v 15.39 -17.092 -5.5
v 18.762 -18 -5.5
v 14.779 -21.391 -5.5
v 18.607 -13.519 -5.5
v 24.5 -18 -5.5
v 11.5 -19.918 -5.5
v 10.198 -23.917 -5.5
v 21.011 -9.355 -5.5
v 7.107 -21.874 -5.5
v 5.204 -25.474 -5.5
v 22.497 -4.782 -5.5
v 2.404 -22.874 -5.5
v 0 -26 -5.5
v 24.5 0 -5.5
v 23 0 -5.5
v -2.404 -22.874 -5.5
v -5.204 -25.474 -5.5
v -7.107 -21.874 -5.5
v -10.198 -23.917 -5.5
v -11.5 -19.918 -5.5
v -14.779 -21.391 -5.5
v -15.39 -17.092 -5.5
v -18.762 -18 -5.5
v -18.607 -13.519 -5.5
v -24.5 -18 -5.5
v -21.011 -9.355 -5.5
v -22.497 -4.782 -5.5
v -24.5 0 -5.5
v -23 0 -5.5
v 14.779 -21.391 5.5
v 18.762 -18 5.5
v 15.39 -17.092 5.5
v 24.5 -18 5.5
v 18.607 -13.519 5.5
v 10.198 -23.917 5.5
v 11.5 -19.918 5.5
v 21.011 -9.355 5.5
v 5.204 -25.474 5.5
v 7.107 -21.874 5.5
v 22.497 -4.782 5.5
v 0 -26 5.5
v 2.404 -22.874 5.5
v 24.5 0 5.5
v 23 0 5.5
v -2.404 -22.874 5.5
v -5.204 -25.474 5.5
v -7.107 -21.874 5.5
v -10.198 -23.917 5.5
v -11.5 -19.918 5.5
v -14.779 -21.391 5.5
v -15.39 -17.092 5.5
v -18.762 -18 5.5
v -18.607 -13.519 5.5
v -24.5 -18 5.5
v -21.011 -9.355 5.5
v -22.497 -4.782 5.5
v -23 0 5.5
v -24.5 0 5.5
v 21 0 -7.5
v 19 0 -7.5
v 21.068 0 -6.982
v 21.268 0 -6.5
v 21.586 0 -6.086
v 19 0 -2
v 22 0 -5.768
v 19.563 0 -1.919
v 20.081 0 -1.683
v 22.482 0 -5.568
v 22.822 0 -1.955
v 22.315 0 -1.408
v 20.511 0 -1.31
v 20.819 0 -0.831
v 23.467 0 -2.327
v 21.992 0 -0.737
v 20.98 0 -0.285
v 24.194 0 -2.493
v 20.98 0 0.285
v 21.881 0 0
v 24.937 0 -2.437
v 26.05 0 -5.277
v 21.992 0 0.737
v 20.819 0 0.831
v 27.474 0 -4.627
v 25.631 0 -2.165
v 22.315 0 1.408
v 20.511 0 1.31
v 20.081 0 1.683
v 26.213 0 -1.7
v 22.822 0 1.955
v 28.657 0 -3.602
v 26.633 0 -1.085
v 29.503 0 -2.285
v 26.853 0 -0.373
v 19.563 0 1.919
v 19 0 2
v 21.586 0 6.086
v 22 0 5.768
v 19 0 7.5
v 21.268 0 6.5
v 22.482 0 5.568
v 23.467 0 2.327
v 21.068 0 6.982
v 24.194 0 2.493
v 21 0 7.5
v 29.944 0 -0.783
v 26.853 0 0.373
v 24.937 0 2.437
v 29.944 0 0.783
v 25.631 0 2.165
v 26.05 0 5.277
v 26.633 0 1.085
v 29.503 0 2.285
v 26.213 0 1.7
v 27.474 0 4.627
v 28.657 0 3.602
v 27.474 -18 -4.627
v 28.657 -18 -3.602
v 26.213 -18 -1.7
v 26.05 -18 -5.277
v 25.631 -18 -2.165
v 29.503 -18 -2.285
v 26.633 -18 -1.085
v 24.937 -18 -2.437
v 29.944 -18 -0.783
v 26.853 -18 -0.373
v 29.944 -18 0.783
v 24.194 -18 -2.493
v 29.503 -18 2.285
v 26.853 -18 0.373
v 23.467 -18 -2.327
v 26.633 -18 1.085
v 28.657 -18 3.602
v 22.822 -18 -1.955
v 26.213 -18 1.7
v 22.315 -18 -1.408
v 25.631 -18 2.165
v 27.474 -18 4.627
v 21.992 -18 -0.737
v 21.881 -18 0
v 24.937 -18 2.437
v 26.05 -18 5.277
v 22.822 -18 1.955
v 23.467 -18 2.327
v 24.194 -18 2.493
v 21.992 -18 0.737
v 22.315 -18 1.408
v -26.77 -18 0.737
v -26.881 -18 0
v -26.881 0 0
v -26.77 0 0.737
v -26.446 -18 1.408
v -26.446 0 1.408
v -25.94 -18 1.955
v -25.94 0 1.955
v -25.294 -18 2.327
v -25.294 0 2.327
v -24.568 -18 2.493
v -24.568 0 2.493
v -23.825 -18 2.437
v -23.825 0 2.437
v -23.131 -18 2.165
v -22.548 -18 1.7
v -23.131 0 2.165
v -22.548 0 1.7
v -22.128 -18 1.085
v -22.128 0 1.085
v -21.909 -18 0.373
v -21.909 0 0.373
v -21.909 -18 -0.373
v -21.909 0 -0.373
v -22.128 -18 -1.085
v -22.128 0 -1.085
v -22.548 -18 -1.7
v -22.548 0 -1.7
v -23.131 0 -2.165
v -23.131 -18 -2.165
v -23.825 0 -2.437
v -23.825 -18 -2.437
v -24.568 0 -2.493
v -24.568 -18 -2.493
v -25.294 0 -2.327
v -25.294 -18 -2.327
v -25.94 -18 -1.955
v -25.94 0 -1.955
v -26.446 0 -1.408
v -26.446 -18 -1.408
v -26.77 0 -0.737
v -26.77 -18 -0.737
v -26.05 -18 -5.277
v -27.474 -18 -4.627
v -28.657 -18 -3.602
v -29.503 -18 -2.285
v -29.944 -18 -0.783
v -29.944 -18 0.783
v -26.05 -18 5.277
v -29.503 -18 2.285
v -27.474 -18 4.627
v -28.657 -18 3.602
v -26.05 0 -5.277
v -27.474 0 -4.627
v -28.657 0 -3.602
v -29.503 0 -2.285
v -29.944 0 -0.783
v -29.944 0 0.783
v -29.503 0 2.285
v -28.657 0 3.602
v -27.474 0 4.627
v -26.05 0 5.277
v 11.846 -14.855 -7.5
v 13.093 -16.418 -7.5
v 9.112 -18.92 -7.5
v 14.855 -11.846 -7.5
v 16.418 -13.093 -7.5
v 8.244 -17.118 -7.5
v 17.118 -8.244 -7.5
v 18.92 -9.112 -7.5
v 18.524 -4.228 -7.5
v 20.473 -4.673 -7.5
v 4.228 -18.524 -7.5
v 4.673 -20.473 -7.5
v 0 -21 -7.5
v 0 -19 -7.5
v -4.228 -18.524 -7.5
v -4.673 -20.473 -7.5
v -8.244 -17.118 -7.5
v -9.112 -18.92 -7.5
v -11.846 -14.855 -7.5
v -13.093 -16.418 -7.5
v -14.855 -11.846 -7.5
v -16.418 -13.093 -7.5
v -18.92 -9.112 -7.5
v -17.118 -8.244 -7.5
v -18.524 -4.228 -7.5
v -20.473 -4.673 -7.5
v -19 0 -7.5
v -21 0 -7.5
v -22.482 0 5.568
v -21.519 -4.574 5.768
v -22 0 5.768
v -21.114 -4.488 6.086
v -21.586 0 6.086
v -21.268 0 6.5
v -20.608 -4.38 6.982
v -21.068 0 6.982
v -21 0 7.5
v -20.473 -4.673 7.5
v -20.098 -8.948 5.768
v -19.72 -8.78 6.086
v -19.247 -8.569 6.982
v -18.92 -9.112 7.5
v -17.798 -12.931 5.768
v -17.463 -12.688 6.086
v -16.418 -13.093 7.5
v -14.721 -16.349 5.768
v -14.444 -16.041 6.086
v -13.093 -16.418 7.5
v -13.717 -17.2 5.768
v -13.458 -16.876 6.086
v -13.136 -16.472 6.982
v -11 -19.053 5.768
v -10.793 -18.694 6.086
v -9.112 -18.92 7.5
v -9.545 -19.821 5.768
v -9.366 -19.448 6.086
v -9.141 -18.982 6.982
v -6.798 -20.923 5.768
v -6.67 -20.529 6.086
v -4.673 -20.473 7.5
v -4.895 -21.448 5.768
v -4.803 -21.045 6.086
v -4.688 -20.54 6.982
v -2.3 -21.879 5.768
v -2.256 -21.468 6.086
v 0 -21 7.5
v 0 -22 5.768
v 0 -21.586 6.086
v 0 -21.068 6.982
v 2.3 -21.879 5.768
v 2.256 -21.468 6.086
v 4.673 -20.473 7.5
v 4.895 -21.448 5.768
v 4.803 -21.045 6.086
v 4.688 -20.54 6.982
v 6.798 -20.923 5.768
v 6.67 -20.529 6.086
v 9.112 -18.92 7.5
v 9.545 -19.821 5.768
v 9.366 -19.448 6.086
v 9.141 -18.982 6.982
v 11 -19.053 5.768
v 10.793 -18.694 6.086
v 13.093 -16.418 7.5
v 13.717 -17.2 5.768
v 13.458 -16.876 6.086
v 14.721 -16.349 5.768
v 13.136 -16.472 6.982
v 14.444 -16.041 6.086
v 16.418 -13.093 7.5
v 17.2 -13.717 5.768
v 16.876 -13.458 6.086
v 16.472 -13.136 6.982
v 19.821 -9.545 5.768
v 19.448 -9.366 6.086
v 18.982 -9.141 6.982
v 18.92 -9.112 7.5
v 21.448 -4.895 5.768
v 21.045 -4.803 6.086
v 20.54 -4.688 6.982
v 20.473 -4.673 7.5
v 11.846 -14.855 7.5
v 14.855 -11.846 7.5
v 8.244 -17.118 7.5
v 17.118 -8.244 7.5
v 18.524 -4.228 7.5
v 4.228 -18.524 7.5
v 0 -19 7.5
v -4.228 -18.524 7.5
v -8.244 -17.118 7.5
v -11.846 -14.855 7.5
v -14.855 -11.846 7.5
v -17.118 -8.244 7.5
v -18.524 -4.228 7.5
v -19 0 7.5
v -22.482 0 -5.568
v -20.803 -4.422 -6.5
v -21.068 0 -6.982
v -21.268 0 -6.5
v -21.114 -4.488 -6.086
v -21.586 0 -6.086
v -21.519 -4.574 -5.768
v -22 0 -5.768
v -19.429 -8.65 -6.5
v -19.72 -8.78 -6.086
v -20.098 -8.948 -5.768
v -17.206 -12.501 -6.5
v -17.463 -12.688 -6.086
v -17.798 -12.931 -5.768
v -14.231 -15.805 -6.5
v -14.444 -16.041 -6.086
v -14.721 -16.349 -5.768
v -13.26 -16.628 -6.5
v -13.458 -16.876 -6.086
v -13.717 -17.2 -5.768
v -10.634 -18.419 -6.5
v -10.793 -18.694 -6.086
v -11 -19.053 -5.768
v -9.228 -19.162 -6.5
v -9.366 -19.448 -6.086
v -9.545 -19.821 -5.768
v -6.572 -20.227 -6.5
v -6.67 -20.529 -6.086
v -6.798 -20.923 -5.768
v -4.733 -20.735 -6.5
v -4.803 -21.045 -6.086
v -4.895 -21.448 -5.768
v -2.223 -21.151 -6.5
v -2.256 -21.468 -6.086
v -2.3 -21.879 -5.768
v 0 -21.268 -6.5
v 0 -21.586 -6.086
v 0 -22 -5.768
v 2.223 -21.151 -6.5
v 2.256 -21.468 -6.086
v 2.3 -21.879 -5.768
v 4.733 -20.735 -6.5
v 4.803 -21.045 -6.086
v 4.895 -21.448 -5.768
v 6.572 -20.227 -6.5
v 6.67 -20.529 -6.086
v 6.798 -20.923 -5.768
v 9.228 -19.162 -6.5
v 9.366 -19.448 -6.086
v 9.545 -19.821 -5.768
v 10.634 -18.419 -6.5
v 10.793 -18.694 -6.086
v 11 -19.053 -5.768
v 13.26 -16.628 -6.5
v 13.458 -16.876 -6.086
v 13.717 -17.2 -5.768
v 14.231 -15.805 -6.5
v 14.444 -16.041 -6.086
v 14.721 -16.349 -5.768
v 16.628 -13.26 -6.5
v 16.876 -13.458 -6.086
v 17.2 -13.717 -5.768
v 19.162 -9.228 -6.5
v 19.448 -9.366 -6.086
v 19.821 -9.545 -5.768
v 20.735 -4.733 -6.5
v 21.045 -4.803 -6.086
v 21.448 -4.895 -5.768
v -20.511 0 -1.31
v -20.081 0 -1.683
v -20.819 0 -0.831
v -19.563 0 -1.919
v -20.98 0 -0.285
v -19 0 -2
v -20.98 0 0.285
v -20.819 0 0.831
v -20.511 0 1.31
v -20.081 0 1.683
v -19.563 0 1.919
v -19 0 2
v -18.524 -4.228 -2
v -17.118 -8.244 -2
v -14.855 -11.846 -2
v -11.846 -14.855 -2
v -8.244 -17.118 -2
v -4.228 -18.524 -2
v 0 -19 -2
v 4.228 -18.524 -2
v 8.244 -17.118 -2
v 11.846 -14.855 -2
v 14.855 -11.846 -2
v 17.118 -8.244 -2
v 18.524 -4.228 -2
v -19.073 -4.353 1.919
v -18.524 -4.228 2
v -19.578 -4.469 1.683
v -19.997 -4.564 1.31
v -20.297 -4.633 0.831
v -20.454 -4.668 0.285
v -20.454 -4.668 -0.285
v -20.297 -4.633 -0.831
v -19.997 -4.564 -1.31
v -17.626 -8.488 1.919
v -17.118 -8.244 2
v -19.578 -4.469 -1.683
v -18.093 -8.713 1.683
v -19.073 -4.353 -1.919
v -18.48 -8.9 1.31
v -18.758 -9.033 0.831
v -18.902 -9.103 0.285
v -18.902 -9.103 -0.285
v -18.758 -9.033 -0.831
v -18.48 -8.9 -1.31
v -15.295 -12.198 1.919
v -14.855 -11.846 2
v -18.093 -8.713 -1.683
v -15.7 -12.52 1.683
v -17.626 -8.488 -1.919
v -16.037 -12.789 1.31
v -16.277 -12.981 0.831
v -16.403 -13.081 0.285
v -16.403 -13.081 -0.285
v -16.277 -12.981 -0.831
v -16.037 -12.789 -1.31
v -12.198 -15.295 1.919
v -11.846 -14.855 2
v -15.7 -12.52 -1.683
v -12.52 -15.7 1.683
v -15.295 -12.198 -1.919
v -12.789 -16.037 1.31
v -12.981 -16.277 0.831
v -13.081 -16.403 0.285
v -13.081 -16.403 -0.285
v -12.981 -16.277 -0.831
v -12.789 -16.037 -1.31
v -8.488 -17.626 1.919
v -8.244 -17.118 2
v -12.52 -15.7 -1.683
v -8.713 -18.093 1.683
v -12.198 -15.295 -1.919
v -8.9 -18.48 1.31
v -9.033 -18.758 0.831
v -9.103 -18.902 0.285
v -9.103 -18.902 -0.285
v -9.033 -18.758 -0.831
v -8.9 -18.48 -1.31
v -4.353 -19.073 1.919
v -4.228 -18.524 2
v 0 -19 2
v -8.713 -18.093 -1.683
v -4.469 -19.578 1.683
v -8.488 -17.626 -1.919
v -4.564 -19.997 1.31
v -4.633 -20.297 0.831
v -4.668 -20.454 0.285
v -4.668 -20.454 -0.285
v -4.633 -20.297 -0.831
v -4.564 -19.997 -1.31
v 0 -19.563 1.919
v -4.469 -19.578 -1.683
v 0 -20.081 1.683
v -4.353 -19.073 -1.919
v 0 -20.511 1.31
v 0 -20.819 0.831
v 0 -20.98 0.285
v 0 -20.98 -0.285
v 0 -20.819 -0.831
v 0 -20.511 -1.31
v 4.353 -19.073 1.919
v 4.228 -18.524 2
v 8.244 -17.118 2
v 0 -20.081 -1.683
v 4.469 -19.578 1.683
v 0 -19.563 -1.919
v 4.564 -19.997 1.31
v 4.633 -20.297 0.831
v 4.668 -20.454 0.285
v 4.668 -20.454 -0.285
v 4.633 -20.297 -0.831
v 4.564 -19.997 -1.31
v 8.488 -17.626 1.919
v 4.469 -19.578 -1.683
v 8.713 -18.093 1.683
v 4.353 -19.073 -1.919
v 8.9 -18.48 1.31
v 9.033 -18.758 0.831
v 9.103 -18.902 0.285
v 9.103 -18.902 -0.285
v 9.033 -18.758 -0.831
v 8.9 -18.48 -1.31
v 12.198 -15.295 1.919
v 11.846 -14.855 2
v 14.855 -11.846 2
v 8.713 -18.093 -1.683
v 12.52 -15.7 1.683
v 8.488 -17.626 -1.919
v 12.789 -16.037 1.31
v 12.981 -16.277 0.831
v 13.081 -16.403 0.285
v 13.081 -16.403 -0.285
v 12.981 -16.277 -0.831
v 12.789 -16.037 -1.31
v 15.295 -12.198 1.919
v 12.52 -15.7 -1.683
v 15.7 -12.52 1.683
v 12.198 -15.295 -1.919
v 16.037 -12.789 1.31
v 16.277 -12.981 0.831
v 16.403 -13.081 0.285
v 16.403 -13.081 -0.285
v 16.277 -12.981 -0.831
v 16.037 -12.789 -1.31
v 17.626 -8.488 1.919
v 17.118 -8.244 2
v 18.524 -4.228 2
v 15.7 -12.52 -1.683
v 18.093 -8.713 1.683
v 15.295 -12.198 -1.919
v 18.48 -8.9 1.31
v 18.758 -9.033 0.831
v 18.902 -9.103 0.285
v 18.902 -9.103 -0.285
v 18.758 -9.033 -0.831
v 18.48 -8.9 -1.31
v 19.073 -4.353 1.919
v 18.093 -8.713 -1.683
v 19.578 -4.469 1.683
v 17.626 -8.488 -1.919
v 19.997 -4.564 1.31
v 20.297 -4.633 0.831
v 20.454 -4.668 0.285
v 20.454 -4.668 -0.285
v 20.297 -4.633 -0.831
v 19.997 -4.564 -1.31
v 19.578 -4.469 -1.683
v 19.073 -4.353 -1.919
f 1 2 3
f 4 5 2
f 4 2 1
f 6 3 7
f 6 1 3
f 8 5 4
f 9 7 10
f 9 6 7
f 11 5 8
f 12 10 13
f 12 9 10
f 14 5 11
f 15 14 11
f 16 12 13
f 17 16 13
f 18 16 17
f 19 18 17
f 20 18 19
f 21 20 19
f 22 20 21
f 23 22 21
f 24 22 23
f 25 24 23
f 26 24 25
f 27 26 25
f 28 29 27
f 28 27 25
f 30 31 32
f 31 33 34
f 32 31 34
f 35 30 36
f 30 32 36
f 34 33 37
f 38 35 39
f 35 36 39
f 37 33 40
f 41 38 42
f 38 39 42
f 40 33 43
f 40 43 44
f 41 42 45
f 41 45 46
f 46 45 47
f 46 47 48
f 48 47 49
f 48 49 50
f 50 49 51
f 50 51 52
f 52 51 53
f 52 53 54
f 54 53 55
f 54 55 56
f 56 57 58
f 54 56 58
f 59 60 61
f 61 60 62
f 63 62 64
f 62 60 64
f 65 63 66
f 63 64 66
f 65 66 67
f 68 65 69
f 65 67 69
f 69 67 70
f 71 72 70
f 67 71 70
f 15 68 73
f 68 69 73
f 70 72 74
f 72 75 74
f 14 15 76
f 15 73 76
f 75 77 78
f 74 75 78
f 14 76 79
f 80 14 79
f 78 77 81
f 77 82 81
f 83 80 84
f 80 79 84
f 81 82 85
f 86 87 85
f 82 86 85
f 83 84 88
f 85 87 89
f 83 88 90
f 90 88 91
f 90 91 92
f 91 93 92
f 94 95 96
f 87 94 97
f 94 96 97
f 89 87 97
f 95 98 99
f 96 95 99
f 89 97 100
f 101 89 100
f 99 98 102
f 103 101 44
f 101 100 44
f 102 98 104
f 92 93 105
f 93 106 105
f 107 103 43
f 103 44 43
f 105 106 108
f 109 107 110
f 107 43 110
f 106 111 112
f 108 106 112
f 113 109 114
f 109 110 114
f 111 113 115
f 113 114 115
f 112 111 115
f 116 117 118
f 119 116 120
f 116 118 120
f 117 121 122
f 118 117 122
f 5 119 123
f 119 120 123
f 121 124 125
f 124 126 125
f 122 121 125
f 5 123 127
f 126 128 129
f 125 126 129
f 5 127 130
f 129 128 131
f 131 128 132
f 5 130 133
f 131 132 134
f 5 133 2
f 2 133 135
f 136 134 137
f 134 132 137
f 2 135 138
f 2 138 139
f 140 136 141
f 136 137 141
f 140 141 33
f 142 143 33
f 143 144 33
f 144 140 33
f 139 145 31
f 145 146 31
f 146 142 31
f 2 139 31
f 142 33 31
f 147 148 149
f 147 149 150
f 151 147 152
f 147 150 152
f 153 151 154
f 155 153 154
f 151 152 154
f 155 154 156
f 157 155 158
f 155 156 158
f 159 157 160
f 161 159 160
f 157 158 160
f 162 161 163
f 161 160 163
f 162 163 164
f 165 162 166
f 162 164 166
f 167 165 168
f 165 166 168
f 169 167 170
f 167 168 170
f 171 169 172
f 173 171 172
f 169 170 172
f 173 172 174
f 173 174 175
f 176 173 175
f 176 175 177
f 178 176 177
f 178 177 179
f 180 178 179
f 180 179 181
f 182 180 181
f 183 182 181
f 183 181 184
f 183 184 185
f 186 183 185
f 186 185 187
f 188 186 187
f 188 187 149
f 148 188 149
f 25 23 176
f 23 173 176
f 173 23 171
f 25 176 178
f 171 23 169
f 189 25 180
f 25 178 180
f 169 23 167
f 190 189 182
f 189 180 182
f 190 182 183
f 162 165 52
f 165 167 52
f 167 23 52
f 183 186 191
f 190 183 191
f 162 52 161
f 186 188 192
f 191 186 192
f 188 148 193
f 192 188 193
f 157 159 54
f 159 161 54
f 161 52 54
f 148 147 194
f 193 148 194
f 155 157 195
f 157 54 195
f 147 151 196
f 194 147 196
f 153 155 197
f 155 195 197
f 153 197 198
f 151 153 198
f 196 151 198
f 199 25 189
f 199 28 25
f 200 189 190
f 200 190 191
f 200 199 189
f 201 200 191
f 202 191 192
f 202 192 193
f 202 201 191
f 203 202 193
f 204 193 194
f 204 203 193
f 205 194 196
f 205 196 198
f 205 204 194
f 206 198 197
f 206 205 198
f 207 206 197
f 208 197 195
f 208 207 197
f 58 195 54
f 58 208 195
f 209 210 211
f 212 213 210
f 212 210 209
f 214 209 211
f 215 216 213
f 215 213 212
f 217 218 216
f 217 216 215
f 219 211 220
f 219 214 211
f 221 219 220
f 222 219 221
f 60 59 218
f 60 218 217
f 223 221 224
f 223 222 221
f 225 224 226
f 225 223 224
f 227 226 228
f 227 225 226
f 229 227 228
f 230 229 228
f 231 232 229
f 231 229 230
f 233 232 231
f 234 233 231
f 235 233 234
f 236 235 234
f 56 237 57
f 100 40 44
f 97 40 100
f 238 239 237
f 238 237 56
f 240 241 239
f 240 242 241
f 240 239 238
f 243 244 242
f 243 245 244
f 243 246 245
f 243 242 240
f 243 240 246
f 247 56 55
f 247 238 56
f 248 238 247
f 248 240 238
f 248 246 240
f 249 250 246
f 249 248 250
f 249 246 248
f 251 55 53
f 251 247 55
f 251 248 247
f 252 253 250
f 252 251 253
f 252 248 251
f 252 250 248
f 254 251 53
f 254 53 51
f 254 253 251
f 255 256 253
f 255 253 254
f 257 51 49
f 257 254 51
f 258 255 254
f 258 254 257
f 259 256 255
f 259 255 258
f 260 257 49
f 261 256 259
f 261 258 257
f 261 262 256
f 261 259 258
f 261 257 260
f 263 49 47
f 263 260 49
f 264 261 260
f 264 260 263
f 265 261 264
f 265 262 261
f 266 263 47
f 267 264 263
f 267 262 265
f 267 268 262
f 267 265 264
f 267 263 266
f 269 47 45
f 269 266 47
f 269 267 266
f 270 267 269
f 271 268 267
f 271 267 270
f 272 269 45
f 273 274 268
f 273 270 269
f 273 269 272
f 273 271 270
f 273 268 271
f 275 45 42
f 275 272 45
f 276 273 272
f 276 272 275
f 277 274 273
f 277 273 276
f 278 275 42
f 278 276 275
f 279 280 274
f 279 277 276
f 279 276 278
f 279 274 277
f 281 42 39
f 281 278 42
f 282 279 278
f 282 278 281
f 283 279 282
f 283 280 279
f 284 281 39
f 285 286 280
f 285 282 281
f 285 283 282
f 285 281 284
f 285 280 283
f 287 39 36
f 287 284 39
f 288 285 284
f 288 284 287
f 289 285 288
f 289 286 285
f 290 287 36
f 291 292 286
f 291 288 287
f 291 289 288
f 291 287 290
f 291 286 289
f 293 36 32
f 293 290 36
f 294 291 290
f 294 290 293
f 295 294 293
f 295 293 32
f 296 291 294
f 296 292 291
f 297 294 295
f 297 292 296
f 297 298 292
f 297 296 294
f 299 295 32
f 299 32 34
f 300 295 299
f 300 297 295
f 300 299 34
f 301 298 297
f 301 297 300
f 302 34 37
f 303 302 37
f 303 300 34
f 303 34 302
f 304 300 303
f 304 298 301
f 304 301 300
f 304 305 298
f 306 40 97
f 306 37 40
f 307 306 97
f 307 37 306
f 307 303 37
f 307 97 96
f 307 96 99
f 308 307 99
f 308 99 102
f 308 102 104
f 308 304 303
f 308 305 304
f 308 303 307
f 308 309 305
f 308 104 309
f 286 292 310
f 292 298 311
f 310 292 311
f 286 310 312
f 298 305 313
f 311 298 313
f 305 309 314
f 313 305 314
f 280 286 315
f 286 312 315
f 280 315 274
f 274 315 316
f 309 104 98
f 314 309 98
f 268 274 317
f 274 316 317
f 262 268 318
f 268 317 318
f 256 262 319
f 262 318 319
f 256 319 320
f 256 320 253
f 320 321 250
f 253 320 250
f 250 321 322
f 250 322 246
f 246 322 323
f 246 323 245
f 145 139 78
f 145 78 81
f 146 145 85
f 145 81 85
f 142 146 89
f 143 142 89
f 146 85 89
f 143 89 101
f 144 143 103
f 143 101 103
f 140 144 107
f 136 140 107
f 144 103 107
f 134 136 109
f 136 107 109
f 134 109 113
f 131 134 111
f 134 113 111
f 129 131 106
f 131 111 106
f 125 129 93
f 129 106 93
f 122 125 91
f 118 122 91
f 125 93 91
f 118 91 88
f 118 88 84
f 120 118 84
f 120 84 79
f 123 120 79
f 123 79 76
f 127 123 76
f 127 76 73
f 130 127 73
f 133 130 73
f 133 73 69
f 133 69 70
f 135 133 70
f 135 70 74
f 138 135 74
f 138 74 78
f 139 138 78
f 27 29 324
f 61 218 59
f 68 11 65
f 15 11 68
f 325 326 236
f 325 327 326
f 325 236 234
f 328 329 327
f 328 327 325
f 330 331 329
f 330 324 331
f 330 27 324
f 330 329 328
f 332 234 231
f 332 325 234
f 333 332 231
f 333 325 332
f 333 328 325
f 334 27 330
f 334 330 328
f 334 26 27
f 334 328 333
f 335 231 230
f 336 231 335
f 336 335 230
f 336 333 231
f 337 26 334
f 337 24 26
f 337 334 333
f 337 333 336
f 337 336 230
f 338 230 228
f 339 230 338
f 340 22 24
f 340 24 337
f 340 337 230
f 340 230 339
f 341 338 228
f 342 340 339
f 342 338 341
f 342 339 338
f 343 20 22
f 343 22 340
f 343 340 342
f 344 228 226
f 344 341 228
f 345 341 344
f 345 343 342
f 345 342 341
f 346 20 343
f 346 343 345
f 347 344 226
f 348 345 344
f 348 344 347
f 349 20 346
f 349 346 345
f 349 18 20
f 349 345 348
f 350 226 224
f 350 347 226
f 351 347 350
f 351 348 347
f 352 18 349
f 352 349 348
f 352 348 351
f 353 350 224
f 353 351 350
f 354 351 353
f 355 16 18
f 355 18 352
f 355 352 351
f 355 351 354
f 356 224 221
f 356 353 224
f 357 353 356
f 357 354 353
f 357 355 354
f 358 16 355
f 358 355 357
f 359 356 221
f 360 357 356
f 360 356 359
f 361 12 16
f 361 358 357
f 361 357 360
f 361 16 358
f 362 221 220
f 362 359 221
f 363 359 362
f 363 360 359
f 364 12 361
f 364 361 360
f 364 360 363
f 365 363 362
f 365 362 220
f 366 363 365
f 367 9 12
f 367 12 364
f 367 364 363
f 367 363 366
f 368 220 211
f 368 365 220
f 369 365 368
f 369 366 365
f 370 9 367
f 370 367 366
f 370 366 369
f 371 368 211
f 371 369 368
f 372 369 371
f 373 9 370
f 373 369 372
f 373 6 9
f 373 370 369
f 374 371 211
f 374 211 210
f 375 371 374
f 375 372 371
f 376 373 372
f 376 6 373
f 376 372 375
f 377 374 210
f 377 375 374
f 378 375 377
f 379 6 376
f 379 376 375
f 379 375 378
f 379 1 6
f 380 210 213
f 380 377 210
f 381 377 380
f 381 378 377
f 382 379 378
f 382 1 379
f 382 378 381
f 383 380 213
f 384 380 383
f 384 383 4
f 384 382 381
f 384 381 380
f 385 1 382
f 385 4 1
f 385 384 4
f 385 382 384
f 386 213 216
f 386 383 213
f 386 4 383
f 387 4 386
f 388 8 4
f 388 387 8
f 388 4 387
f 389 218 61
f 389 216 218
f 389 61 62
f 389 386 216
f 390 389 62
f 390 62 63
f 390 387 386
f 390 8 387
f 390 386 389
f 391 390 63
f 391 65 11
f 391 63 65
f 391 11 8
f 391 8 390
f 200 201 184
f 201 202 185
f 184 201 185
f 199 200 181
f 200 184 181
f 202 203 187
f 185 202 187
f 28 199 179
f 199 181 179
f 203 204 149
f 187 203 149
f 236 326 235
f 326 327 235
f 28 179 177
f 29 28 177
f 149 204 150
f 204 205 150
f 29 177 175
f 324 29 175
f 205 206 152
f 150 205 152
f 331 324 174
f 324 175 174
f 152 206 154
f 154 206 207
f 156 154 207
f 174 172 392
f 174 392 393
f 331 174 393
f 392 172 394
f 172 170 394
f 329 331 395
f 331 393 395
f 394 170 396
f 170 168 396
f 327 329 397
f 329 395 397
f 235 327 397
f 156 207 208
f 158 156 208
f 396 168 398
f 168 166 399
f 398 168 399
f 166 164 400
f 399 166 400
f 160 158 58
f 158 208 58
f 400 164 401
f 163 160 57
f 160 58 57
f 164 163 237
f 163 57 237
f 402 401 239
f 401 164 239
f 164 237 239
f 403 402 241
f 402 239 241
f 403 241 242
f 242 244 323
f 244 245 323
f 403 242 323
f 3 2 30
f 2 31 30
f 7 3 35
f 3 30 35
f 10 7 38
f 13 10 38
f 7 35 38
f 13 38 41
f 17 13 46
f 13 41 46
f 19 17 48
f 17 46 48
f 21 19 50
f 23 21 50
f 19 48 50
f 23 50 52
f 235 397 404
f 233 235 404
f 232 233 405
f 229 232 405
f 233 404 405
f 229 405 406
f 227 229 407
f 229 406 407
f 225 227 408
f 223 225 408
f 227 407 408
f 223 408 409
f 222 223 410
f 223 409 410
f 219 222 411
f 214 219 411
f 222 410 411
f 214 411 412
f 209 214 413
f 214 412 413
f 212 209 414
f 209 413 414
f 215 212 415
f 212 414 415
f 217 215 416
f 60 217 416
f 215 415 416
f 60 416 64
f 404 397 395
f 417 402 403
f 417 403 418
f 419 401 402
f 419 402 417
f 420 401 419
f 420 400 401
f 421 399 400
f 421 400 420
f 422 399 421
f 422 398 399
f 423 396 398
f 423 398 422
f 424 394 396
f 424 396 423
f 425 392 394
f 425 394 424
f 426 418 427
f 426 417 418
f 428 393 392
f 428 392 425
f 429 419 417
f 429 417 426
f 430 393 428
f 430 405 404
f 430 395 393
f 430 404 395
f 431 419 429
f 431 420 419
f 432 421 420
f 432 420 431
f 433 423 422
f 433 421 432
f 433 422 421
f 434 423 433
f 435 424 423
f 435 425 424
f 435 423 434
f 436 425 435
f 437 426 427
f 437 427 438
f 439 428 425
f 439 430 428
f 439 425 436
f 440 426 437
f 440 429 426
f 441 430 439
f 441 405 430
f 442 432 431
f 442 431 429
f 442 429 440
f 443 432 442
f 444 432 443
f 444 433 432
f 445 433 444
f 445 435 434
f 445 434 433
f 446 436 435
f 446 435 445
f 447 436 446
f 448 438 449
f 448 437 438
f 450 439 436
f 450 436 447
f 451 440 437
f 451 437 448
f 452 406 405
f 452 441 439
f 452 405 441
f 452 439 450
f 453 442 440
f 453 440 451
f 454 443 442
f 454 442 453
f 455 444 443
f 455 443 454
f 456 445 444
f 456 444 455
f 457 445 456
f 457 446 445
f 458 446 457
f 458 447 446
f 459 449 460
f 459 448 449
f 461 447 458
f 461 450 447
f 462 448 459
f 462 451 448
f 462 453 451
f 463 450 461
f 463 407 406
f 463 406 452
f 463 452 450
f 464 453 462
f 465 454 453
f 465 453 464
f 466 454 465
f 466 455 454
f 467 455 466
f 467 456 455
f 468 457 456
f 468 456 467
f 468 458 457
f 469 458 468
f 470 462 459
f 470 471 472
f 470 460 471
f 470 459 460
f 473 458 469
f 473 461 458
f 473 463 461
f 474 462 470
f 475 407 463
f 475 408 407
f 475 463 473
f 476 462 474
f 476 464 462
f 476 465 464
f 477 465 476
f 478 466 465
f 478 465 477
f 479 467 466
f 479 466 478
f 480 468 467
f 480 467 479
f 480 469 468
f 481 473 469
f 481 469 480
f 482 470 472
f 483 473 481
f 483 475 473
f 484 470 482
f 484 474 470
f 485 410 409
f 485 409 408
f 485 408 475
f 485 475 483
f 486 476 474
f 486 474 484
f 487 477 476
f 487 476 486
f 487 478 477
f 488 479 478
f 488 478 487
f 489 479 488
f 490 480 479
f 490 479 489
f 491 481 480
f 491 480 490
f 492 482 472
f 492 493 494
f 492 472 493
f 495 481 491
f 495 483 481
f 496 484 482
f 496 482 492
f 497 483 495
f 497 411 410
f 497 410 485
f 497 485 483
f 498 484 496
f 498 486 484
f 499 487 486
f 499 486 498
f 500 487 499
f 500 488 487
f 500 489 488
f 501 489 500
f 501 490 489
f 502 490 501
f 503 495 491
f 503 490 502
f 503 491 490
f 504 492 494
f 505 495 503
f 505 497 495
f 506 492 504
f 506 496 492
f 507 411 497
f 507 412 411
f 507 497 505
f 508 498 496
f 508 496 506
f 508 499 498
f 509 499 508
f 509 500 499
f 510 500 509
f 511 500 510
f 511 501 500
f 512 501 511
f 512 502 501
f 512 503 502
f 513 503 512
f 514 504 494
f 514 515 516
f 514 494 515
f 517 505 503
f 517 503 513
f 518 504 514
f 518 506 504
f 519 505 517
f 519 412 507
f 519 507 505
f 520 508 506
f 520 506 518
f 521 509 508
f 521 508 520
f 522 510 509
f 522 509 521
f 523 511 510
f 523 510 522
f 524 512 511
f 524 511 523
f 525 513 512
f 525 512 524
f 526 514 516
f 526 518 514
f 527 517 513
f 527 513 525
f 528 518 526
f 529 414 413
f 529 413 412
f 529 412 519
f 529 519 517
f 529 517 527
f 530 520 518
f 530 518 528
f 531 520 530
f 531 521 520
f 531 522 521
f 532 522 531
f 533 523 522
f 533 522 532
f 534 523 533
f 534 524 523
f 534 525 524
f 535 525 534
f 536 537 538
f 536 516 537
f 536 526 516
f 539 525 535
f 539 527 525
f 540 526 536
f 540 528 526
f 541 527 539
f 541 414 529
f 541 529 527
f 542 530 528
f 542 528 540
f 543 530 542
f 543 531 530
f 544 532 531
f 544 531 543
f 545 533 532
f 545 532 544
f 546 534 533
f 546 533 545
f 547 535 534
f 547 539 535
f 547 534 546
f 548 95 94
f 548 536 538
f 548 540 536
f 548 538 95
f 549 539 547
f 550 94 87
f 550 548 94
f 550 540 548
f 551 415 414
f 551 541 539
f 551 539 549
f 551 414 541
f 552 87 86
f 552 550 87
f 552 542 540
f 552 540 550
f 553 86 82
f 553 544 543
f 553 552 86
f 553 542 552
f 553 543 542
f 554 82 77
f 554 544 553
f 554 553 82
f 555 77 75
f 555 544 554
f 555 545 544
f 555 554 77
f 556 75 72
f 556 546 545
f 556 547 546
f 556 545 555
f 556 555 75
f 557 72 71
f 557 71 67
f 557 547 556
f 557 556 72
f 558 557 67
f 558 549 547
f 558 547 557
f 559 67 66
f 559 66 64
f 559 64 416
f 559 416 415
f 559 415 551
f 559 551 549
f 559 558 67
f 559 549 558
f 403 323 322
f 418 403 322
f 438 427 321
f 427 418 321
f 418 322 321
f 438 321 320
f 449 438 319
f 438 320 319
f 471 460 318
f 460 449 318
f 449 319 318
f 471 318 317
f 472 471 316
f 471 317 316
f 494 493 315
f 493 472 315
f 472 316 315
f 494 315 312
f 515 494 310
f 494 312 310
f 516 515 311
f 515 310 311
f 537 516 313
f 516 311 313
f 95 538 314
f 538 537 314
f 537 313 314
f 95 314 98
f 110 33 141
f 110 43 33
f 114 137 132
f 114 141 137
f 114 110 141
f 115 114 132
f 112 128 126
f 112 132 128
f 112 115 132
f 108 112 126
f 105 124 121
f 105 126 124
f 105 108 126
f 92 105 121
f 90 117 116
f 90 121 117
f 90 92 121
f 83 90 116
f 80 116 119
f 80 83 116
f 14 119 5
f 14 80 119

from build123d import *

# Parameters (mm, degrees)
BOSS_EXTRUDE1_DEPTH = 5.5
BOSS_EXTRUDE2_DEPTH = 7.5
SKETCH4_R           = 2.5
CUT_EXTRUDE1_DEPTH  = 41.401113846
FILLET1_R           = 2
SKETCH5_R           = 2
FILLET2_RADIUS      = 5.5
FILLET2_LENGTH      = 18
FILLET3_RADIUS      = 5.5
FILLET3_LENGTH      = 18


with BuildPart() as part:
    # Sketch1 → Boss-Extrude1 (new, symmetric)
    with BuildSketch(Plane.XY):
        with BuildLine():
            Line((19, 0), (30, 0))
            Line((30, 0), (30, -18))
            Line((30, -18), (18.761663039, -18))
            ThreePointArc((18.761663039, -18), (0, -26), (-18.761663039, -18))
            Line((-18.761663039, -18), (-30, -18))
            Line((-30, -18), (-30, 0))
            Line((-30, 0), (-19, 0))
            ThreePointArc((-19, 0), (0, -19), (19, 0))
        make_face()
    extrude(amount=BOSS_EXTRUDE1_DEPTH, both=True)

    # Sketch3 → Boss-Extrude2 (add, symmetric)
    with BuildSketch(Plane.XY):
        with BuildLine():
            Line((-21, 0), (-19, 0))
            ThreePointArc((-19, 0), (0, -19), (19, 0))
            Line((19, 0), (21, 0))
            ThreePointArc((21, 0), (0, -21), (-21, 0))
        make_face()
    extrude(amount=BOSS_EXTRUDE2_DEPTH, both=True)

    # Sketch4 → Cut-Extrude1 (cut, through all)
    with BuildSketch(Plane(origin=(0, 0, 0), x_dir=(1, 0, 0), z_dir=(0, 1, 0))):
        with Locations(Location((-24.38083152, 0, 0), (0, 0, 180))):
            Circle(SKETCH4_R)
        with Locations(Location((24.38083152, 0, 0), (0, 0, 180))):
            Circle(SKETCH4_R)
    extrude(amount=-CUT_EXTRUDE1_DEPTH, mode=Mode.SUBTRACT)

    # Fillet1
    fillet1_edges = [part.edges().sort_by_distance(p)[0] for p in [
        (0, -21, -5.5),
        (0, -21, 5.5),
    ]]
    fillet(fillet1_edges, radius=FILLET1_R - 0.0001)  # a hair under: the kernel refuses the full size

    # Sketch5 → Cut-Revolve1 (revolve, cut)
    with BuildSketch(Plane(origin=(0, 0, 0), x_dir=(1, 0, 0), z_dir=(0, 1, 0))):
        with Locations((19, 0)):
            Circle(SKETCH5_R)
    revolve(axis=Axis((0, 0, -5.716287215), (0, 0, 1)), mode=Mode.SUBTRACT)

    # Fillet2: full round fillet: the end face becomes a half cylinder, R = half its width
    fillet2_face = Plane((30, -9, 0), x_dir=(0, 1, 0), z_dir=(1, 0, 0))  # on the end face: x along it, z out of the body
    fillet2_slab = fillet2_face.offset(-FILLET2_RADIUS / 2) * Box(FILLET2_LENGTH, 2 * FILLET2_RADIUS, FILLET2_RADIUS, mode=Mode.PRIVATE)  # the body's end, R deep
    fillet2_round = Plane((24.5, -9, 0), x_dir=(1, 0, 0), z_dir=(0, 1, 0)) * Cylinder(FILLET2_RADIUS, FILLET2_LENGTH, mode=Mode.PRIVATE)  # its axis R under the face
    add(fillet2_slab - fillet2_round, mode=Mode.SUBTRACT)

    # Fillet3: full round fillet: the end face becomes a half cylinder, R = half its width
    fillet3_face = Plane((-30, -9, 0), x_dir=(0, 1, 0), z_dir=(-1, 0, 0))  # on the end face: x along it, z out of the body
    fillet3_slab = fillet3_face.offset(-FILLET3_RADIUS / 2) * Box(FILLET3_LENGTH, 2 * FILLET3_RADIUS, FILLET3_RADIUS, mode=Mode.PRIVATE)  # the body's end, R deep
    fillet3_round = Plane((-24.5, -9, 0), x_dir=(-1, 0, 0), z_dir=(0, 1, 0)) * Cylinder(FILLET3_RADIUS, FILLET3_LENGTH, mode=Mode.PRIVATE)  # its axis R under the face
    add(fillet3_slab - fillet3_round, mode=Mode.SUBTRACT)


solid = part.part
